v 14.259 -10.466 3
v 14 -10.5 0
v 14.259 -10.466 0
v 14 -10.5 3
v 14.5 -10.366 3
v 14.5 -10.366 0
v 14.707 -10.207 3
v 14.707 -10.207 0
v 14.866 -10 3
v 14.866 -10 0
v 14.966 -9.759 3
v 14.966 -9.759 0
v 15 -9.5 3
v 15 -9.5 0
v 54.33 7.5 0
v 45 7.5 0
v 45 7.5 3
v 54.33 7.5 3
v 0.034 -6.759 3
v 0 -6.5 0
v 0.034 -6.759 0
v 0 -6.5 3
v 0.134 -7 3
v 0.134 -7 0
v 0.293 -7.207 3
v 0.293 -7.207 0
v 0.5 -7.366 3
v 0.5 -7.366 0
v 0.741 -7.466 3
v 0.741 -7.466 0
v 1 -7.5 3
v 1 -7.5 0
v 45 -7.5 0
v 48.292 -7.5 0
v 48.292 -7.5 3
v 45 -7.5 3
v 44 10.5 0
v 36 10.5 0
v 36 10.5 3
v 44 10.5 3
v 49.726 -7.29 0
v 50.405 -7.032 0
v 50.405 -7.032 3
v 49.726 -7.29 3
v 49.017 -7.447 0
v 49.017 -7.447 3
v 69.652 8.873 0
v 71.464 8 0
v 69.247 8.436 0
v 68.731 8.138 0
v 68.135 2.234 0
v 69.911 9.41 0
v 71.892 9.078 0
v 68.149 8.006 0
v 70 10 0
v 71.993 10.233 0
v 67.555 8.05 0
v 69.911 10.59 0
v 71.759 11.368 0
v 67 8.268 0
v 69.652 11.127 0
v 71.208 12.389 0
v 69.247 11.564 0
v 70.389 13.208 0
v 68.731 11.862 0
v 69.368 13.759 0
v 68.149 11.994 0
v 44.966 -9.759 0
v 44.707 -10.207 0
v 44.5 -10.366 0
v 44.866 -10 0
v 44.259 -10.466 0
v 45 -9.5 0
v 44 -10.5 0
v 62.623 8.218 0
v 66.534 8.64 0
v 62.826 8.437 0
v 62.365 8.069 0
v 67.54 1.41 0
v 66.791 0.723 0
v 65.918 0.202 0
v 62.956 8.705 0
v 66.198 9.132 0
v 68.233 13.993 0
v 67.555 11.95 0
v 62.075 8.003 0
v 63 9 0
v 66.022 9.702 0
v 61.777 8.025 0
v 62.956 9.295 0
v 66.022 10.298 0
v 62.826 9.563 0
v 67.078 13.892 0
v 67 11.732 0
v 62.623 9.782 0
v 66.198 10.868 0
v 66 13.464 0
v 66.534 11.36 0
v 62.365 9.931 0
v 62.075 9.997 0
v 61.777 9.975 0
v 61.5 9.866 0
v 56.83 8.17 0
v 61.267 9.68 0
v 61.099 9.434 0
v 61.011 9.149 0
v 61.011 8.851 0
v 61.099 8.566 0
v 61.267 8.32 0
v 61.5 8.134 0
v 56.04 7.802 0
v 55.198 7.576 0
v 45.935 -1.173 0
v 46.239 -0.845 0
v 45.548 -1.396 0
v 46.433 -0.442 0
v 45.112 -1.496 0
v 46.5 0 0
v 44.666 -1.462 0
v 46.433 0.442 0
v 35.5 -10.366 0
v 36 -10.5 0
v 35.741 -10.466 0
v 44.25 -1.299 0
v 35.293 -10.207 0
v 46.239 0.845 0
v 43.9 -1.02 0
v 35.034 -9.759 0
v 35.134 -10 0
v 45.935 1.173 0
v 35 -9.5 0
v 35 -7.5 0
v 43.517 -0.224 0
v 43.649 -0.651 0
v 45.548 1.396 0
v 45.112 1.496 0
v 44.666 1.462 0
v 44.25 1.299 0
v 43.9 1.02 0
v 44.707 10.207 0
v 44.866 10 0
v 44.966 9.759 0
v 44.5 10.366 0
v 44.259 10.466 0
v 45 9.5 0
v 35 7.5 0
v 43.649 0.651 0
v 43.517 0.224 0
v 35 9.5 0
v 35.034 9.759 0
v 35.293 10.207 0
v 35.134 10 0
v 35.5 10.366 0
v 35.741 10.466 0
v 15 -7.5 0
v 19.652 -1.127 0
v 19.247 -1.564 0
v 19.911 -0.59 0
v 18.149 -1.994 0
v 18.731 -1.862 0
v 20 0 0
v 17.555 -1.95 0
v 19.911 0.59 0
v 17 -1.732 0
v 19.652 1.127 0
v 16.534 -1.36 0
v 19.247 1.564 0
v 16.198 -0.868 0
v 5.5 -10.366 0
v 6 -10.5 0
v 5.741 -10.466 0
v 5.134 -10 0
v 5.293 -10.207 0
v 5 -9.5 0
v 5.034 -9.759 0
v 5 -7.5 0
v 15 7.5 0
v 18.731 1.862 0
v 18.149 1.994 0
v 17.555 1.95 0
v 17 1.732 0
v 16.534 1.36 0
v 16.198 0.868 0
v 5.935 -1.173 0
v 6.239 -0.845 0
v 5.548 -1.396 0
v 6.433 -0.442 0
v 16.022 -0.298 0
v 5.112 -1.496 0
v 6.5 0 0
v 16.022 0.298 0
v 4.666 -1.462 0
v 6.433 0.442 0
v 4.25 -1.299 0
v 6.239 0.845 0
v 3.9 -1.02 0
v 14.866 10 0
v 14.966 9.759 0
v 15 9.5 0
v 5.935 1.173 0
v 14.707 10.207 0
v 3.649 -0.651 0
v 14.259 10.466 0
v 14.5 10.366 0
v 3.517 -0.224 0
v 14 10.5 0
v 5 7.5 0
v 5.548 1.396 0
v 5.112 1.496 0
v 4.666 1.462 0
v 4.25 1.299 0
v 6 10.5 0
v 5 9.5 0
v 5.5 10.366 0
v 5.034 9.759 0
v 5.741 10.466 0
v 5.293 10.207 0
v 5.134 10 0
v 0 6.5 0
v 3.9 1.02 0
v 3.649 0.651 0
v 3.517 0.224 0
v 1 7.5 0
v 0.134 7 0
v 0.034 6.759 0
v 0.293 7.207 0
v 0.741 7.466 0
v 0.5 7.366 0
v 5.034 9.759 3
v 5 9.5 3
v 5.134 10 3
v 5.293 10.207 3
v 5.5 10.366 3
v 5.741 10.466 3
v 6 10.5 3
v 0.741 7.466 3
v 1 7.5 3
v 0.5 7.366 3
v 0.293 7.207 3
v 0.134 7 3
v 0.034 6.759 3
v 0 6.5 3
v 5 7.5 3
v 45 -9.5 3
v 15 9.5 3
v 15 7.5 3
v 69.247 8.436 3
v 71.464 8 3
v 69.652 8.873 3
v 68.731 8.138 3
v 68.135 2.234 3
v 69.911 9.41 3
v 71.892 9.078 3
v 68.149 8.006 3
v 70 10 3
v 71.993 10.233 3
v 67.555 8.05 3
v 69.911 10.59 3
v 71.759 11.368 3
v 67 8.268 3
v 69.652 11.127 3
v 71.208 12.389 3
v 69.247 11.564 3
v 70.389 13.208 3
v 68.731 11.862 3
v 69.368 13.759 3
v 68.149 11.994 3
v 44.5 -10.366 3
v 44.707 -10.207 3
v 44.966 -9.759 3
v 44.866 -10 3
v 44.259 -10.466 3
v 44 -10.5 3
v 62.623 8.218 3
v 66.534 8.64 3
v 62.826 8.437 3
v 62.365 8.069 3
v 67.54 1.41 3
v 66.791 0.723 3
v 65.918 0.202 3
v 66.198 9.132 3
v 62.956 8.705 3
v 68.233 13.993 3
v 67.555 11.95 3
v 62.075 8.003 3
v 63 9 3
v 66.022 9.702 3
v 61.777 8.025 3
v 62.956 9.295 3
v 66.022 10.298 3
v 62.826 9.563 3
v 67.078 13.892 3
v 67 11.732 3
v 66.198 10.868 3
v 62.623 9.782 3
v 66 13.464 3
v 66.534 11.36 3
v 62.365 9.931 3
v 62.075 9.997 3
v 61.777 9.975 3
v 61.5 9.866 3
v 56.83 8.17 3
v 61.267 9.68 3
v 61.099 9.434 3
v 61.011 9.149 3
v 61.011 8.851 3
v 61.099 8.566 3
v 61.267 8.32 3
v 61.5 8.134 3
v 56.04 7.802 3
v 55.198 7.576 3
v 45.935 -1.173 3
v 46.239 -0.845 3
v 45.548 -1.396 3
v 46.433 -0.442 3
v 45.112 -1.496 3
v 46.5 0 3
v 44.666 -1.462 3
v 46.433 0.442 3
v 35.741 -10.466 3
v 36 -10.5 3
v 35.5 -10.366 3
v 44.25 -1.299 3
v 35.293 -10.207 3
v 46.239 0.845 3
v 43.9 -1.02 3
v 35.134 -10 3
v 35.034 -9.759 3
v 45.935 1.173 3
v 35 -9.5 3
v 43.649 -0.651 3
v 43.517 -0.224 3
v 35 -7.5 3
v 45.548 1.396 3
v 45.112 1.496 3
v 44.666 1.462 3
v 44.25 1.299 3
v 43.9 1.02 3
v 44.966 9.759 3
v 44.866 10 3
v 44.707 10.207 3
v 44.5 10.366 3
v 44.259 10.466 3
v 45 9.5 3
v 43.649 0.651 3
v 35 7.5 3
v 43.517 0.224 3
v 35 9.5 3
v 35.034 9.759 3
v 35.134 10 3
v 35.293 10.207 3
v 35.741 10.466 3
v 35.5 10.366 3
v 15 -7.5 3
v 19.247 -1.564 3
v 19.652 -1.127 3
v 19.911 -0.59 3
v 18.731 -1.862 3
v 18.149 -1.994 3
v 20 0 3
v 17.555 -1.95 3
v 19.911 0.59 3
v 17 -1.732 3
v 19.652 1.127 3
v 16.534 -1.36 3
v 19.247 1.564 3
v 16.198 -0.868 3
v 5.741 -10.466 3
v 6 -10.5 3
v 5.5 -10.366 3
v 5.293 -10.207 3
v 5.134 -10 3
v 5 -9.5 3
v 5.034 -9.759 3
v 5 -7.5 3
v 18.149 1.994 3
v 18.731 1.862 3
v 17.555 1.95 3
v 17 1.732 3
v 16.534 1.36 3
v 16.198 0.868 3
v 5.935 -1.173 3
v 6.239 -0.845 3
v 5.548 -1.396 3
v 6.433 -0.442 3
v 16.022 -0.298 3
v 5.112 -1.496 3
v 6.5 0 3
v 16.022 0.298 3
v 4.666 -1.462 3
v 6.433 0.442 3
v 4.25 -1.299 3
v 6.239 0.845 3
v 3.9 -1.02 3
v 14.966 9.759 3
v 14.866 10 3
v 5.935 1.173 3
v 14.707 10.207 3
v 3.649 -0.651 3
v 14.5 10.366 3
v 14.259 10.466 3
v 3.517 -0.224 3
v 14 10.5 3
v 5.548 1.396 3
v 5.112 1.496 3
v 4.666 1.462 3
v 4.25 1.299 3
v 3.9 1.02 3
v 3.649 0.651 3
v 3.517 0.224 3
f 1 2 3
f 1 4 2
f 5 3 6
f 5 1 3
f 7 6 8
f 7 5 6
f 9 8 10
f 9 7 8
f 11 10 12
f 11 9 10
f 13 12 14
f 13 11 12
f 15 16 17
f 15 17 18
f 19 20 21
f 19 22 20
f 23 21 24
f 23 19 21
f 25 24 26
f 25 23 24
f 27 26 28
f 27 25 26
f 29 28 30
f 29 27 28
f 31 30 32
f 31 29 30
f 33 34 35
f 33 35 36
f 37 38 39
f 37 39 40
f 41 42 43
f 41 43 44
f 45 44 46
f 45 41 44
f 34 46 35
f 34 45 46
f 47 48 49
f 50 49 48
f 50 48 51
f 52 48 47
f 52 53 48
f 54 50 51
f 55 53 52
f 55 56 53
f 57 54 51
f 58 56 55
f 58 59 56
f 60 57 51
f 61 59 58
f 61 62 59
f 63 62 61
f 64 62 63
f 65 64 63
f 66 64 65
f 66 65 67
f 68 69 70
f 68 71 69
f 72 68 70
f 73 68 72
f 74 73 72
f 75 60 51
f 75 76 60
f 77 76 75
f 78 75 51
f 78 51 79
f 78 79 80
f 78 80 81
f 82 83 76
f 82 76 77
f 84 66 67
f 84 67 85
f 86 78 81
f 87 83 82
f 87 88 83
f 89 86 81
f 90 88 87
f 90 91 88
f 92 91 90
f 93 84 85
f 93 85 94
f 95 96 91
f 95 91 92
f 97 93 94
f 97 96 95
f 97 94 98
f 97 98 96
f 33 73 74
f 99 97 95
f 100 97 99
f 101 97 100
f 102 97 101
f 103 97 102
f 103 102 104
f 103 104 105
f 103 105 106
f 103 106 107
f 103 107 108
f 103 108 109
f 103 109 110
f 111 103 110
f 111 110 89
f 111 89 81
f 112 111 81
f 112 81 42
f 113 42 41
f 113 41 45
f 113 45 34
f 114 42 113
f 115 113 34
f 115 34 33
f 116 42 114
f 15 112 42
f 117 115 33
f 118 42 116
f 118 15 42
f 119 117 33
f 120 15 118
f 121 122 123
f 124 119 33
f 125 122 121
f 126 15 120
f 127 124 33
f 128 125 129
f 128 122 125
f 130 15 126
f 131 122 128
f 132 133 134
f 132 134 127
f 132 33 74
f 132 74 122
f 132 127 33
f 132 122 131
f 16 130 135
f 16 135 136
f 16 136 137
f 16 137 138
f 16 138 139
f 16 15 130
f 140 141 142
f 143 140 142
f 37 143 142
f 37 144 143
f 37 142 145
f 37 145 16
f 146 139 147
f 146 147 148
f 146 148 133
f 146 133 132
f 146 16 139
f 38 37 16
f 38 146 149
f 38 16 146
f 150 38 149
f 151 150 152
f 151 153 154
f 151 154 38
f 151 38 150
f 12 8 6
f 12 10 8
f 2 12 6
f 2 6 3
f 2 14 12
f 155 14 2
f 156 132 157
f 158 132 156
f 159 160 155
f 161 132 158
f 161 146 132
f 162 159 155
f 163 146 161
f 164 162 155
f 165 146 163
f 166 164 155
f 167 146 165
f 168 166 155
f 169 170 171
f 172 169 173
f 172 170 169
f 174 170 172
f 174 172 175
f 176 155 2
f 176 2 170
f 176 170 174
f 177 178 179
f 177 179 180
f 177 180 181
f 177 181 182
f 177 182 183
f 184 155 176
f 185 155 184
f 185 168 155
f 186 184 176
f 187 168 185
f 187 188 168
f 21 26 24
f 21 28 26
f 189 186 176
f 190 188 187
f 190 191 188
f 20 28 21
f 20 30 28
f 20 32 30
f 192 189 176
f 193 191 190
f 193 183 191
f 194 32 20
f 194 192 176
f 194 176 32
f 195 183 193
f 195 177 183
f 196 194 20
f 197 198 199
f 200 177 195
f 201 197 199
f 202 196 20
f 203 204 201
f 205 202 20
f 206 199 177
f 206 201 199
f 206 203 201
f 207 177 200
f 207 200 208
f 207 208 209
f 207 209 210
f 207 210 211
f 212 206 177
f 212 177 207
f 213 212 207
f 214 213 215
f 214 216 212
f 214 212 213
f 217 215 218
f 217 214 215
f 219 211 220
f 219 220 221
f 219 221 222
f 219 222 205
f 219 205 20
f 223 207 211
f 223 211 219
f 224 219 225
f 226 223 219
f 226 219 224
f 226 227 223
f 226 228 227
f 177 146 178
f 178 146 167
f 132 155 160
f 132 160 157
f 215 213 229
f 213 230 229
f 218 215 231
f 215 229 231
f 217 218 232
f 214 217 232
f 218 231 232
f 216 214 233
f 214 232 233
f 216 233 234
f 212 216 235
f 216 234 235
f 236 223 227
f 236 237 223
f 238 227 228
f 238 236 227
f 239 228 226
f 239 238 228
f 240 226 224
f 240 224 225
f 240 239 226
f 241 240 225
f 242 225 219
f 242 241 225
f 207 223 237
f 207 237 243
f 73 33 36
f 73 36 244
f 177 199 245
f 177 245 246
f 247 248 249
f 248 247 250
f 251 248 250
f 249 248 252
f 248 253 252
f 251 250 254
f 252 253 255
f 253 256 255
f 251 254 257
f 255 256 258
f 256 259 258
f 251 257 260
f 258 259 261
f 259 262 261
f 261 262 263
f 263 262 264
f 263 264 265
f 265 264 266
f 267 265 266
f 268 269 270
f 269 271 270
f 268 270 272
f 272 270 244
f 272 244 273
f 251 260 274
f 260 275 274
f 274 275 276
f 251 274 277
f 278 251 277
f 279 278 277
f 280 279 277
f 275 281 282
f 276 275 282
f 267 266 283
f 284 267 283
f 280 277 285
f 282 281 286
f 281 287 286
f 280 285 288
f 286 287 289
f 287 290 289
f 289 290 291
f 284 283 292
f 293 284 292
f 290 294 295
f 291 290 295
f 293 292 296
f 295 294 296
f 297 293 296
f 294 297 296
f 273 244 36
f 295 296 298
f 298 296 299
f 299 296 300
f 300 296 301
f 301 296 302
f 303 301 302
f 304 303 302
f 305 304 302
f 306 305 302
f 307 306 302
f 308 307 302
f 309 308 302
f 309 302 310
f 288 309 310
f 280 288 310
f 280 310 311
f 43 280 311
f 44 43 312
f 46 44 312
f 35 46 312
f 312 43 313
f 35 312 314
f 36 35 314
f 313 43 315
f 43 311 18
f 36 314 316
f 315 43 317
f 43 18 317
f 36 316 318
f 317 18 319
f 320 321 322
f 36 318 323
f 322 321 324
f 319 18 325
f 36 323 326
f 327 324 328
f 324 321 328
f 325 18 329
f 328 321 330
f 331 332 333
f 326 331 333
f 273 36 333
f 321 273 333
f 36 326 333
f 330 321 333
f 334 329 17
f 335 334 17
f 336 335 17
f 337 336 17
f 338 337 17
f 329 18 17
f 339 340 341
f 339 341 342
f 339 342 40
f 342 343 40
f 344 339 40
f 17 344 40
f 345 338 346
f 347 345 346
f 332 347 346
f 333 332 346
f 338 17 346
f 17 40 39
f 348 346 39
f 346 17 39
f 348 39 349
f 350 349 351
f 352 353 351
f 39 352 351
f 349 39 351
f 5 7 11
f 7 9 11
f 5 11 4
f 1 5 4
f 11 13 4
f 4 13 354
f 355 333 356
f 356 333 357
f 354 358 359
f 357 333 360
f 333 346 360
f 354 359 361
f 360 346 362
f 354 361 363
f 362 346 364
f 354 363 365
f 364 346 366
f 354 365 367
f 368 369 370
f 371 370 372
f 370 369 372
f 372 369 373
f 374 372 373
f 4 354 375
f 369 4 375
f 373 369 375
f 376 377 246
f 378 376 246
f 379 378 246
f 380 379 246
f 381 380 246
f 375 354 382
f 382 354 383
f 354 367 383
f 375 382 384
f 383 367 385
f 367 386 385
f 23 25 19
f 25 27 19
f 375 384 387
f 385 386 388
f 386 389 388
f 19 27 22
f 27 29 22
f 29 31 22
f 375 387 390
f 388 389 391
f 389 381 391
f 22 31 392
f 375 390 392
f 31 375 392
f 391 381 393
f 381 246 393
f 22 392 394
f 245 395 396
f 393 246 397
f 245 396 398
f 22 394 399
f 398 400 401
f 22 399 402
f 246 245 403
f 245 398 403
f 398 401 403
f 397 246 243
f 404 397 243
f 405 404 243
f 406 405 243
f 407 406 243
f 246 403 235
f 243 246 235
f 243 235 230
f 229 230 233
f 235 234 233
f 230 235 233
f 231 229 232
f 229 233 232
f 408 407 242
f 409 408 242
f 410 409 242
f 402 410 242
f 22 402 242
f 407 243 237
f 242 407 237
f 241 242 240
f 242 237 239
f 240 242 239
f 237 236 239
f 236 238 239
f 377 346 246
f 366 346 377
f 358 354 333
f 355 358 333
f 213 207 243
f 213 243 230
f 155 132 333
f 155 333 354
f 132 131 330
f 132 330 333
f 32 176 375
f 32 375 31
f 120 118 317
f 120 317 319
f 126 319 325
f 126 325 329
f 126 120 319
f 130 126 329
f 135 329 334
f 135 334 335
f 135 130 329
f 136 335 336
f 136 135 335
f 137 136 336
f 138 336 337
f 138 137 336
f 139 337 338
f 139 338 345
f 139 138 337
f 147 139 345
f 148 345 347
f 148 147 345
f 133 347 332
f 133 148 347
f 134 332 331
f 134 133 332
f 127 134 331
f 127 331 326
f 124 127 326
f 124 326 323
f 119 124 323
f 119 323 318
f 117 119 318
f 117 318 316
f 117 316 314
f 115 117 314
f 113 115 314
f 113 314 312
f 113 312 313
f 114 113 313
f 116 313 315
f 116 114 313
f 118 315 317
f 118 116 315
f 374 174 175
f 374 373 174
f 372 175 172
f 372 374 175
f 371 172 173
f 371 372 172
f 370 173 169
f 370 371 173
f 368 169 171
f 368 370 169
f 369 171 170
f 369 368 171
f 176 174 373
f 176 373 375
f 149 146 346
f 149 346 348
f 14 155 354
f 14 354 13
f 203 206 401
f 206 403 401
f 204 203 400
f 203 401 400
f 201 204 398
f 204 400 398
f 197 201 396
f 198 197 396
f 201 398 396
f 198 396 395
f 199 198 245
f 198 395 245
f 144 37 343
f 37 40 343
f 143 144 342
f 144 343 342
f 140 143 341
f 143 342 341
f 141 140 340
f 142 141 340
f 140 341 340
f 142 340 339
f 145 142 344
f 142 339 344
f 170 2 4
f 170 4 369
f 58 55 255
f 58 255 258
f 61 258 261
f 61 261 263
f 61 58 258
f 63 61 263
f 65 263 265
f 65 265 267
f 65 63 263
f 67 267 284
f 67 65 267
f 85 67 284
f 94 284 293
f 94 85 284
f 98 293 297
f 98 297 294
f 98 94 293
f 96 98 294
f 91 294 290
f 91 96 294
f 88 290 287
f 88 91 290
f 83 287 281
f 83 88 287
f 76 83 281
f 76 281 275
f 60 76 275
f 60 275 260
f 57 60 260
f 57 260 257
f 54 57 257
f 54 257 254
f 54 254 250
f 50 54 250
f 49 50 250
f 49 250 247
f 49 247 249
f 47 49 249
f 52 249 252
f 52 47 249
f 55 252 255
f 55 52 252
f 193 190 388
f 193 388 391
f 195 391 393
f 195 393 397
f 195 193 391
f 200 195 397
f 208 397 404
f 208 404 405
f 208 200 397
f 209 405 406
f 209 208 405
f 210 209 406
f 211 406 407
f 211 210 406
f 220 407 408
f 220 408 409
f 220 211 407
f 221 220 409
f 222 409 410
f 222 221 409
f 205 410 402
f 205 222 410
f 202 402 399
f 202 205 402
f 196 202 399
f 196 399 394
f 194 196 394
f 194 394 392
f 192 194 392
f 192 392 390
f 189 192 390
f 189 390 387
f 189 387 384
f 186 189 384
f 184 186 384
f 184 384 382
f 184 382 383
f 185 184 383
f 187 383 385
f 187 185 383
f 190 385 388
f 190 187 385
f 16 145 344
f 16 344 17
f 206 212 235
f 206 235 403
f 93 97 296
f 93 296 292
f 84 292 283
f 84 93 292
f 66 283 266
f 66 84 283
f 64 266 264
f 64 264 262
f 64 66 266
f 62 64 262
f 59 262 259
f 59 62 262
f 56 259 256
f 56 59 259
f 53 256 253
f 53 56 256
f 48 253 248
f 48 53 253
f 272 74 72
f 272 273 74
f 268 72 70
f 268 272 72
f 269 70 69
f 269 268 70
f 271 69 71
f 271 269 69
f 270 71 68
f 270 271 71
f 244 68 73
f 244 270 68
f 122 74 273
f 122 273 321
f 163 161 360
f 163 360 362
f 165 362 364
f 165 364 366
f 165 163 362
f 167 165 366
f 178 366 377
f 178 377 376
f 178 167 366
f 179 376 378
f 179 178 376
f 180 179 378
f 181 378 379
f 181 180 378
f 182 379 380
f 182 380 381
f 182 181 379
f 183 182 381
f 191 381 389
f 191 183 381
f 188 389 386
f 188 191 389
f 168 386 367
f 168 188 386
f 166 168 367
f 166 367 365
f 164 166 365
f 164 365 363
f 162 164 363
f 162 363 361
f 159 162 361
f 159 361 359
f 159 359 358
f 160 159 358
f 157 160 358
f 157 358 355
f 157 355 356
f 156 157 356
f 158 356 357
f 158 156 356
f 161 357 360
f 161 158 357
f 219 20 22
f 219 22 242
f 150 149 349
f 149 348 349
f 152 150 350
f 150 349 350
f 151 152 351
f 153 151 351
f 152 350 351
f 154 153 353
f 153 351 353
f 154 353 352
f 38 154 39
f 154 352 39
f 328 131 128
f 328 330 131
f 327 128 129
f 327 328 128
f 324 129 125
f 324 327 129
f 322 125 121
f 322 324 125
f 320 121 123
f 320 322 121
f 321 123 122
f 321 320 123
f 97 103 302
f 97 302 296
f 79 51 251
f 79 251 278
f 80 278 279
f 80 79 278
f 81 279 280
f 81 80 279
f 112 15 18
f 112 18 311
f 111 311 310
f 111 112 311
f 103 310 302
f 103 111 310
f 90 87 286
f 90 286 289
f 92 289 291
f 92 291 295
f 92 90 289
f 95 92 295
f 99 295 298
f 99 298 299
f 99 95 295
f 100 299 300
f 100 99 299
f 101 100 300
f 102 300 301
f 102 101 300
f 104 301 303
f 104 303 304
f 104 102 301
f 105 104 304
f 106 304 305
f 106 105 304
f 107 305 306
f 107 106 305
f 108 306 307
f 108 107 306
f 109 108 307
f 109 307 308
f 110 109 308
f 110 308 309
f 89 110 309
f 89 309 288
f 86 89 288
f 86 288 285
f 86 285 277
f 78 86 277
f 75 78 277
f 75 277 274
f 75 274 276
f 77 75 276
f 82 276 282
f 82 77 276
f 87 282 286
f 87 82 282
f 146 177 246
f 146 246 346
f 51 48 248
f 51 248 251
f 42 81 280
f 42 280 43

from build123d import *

# Parameters (mm, degrees)
SKETCH_1_R      = 2
SKETCH_1_R_2    = 1.5
SKETCH_1_R_3    = 1
EXTRUDE_1_DEPTH = 3
FILLET_1_R      = 1


with BuildPart() as part:
    # 草图1 → 凸台-拉伸1 (new body)
    with BuildSketch(Plane.XY):
        with BuildLine():
            Line((0, 7.5), (5, 7.5))
            Line((5, 7.5), (5, 10.5))
            Line((5, 10.5), (15, 10.5))
            Line((15, 10.5), (15, 7.5))
            Line((15, 7.5), (35, 7.5))
            Line((35, 7.5), (35, 10.5))
            Line((35, 10.5), (45, 10.5))
            Line((45, 10.5), (45, 7.5))
            Line((45, 7.5), (54.330127019, 7.5))
            ThreePointArc((54.330127019, 7.5), (55.624222244, 7.670370869), (56.830127019, 8.169872981))
            Line((56.830127019, 8.169872981), (66, 13.464101615))
            ThreePointArc((66, 13.464101615), (70.828427125, 12.828427125), (71.464101615, 8))
            Line((71.464101615, 8), (68.134857418, 2.2335799))
            ThreePointArc((68.134857418, 2.2335799), (67.182681437, 1.047193216), (65.917821708, 0.202040965))
            Line((65.917821708, 0.202040965), (50.405359552, -7.031538935))
            ThreePointArc((50.405359552, -7.031538935), (49.374466313, -7.381480036), (48.292268243, -7.5))
            Line((48.292268243, -7.5), (45, -7.5))
            Line((45, -7.5), (45, -10.5))
            Line((45, -10.5), (35, -10.5))
            Line((35, -10.5), (35, -7.5))
            Line((35, -7.5), (15, -7.5))
            Line((15, -7.5), (15, -10.5))
            Line((15, -10.5), (5, -10.5))
            Line((5, -10.5), (5, -7.5))
            Line((5, -7.5), (0, -7.5))
            Line((0, -7.5), (0, 7.5))
        make_face()
        with Locations((68, 10)):
            Circle(SKETCH_1_R, mode=Mode.SUBTRACT)
        with Locations((5, 0)):
            Circle(SKETCH_1_R_2, mode=Mode.SUBTRACT)
        with Locations((45, 0)):
            Circle(SKETCH_1_R_2, mode=Mode.SUBTRACT)
        with Locations((18, 0)):
            Circle(SKETCH_1_R, mode=Mode.SUBTRACT)
        with Locations((62, 9)):
            Circle(SKETCH_1_R_3, mode=Mode.SUBTRACT)
    extrude(amount=EXTRUDE_1_DEPTH)

    # 圆角1
    fillet_1_edges = [part.edges().sort_by_distance(p)[0] for p in [
        (0, 7.5, 1.5),
        (5, 10.5, 1.5),
        (15, 10.5, 1.5),
        (35, 10.5, 1.5),
        (45, 10.5, 1.5),
        (45, -10.5, 1.5),
        (35, -10.5, 1.5),
        (15, -10.5, 1.5),
        (5, -10.5, 1.5),
        (0, -7.5, 1.5),
    ]]
    fillet(fillet_1_edges, radius=FILLET_1_R)


solid = part.part
